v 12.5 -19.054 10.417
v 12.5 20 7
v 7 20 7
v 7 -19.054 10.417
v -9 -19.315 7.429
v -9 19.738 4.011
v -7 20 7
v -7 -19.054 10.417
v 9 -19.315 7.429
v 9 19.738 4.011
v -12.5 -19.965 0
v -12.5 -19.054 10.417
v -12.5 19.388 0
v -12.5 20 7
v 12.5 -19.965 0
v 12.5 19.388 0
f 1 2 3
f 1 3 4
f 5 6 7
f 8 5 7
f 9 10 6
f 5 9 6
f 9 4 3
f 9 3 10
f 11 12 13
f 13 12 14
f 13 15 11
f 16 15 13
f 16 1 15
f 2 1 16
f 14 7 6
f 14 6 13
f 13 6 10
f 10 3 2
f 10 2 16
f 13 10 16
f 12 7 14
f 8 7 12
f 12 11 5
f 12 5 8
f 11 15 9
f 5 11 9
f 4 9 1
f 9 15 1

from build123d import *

# Parameters (mm, degrees)
F2_DEPTH      = 12.5
F3_W          = 25
F3_H          = 7.5488379344
F4_DEPTH      = 12.5
F7_DEPTH      = 49.8707171405
F7_DEPTH_BACK = 0.7841883029
F8_DEPTH      = 7.5488379344
F11_DEPTH     = 25


with BuildPart() as f2:
    # F1 (on Right) → F2 (new body, symmetric)
    with BuildSketch(Plane.YZ):
        Polygon((-20, 0), (20, 0), (20, 7), (-20, 10.5), (-20, 7), align=None)
    extrude(amount=F2_DEPTH, both=True)


with BuildPart() as f4:
    # F3 (on face) → F4 (new body, symmetric)
    with BuildSketch(Plane(origin=(0, 0.7598077221, 8.6835168243), x_dir=(1, 0, 0), z_dir=(0, 0.0871669503, 0.9961937175))):
        with Locations((0, -24.6135462951)):
            Rectangle(F3_W, F3_H)
    extrude(amount=F4_DEPTH, both=True)


with BuildPart() as f7_tool:
    # F6 (on offset) → F7 (new body, two sides)
    with BuildSketch(Plane(origin=(0, 19.2373700353, -1.6832698781), x_dir=(-1, 0, 0), z_dir=(0, 0.9961937175, -0.0871669503))) as f7_sk:
        Polygon((-7, 5.7166950281), (7, 5.7166950281), (9, 5.7166950281), (7, 8.7166950281), (-7, 8.7166950281), (-9, 5.7166950281), align=None)
    extrude(amount=-F7_DEPTH)
    extrude(f7_sk.sketch, amount=F7_DEPTH_BACK)


with BuildPart() as f2_1:
    add(f2.part)

    # F7: cut by f7_tool
    add(f7_tool.part, mode=Mode.SUBTRACT)

    # F10 (on face) → F11 (cut, through all)
    with BuildSketch(Plane.YZ.offset(12.5)):
        Polygon((-19.9651202156, 0), (-19.0536159684, 10.4171913972), (-20, 10.5), (-20, 0), align=None)
        Polygon((20, 0), (20, 7), (19.3875, 0), align=None)
    extrude(amount=-F11_DEPTH, mode=Mode.SUBTRACT)


with BuildPart() as f4_1:
    add(f4.part)

    # F7: cut by f7_tool
    add(f7_tool.part, mode=Mode.SUBTRACT)

    # F8 (cut, through all): a face of the model
    f8_faces = [f4_1.faces().sort_by_distance(p)[0] for p in [
        (0, -27.5087747318, 11.2874970991),
    ]]
    extrude(f8_faces, amount=-F8_DEPTH, mode=Mode.SUBTRACT)


solid = f2_1.part
